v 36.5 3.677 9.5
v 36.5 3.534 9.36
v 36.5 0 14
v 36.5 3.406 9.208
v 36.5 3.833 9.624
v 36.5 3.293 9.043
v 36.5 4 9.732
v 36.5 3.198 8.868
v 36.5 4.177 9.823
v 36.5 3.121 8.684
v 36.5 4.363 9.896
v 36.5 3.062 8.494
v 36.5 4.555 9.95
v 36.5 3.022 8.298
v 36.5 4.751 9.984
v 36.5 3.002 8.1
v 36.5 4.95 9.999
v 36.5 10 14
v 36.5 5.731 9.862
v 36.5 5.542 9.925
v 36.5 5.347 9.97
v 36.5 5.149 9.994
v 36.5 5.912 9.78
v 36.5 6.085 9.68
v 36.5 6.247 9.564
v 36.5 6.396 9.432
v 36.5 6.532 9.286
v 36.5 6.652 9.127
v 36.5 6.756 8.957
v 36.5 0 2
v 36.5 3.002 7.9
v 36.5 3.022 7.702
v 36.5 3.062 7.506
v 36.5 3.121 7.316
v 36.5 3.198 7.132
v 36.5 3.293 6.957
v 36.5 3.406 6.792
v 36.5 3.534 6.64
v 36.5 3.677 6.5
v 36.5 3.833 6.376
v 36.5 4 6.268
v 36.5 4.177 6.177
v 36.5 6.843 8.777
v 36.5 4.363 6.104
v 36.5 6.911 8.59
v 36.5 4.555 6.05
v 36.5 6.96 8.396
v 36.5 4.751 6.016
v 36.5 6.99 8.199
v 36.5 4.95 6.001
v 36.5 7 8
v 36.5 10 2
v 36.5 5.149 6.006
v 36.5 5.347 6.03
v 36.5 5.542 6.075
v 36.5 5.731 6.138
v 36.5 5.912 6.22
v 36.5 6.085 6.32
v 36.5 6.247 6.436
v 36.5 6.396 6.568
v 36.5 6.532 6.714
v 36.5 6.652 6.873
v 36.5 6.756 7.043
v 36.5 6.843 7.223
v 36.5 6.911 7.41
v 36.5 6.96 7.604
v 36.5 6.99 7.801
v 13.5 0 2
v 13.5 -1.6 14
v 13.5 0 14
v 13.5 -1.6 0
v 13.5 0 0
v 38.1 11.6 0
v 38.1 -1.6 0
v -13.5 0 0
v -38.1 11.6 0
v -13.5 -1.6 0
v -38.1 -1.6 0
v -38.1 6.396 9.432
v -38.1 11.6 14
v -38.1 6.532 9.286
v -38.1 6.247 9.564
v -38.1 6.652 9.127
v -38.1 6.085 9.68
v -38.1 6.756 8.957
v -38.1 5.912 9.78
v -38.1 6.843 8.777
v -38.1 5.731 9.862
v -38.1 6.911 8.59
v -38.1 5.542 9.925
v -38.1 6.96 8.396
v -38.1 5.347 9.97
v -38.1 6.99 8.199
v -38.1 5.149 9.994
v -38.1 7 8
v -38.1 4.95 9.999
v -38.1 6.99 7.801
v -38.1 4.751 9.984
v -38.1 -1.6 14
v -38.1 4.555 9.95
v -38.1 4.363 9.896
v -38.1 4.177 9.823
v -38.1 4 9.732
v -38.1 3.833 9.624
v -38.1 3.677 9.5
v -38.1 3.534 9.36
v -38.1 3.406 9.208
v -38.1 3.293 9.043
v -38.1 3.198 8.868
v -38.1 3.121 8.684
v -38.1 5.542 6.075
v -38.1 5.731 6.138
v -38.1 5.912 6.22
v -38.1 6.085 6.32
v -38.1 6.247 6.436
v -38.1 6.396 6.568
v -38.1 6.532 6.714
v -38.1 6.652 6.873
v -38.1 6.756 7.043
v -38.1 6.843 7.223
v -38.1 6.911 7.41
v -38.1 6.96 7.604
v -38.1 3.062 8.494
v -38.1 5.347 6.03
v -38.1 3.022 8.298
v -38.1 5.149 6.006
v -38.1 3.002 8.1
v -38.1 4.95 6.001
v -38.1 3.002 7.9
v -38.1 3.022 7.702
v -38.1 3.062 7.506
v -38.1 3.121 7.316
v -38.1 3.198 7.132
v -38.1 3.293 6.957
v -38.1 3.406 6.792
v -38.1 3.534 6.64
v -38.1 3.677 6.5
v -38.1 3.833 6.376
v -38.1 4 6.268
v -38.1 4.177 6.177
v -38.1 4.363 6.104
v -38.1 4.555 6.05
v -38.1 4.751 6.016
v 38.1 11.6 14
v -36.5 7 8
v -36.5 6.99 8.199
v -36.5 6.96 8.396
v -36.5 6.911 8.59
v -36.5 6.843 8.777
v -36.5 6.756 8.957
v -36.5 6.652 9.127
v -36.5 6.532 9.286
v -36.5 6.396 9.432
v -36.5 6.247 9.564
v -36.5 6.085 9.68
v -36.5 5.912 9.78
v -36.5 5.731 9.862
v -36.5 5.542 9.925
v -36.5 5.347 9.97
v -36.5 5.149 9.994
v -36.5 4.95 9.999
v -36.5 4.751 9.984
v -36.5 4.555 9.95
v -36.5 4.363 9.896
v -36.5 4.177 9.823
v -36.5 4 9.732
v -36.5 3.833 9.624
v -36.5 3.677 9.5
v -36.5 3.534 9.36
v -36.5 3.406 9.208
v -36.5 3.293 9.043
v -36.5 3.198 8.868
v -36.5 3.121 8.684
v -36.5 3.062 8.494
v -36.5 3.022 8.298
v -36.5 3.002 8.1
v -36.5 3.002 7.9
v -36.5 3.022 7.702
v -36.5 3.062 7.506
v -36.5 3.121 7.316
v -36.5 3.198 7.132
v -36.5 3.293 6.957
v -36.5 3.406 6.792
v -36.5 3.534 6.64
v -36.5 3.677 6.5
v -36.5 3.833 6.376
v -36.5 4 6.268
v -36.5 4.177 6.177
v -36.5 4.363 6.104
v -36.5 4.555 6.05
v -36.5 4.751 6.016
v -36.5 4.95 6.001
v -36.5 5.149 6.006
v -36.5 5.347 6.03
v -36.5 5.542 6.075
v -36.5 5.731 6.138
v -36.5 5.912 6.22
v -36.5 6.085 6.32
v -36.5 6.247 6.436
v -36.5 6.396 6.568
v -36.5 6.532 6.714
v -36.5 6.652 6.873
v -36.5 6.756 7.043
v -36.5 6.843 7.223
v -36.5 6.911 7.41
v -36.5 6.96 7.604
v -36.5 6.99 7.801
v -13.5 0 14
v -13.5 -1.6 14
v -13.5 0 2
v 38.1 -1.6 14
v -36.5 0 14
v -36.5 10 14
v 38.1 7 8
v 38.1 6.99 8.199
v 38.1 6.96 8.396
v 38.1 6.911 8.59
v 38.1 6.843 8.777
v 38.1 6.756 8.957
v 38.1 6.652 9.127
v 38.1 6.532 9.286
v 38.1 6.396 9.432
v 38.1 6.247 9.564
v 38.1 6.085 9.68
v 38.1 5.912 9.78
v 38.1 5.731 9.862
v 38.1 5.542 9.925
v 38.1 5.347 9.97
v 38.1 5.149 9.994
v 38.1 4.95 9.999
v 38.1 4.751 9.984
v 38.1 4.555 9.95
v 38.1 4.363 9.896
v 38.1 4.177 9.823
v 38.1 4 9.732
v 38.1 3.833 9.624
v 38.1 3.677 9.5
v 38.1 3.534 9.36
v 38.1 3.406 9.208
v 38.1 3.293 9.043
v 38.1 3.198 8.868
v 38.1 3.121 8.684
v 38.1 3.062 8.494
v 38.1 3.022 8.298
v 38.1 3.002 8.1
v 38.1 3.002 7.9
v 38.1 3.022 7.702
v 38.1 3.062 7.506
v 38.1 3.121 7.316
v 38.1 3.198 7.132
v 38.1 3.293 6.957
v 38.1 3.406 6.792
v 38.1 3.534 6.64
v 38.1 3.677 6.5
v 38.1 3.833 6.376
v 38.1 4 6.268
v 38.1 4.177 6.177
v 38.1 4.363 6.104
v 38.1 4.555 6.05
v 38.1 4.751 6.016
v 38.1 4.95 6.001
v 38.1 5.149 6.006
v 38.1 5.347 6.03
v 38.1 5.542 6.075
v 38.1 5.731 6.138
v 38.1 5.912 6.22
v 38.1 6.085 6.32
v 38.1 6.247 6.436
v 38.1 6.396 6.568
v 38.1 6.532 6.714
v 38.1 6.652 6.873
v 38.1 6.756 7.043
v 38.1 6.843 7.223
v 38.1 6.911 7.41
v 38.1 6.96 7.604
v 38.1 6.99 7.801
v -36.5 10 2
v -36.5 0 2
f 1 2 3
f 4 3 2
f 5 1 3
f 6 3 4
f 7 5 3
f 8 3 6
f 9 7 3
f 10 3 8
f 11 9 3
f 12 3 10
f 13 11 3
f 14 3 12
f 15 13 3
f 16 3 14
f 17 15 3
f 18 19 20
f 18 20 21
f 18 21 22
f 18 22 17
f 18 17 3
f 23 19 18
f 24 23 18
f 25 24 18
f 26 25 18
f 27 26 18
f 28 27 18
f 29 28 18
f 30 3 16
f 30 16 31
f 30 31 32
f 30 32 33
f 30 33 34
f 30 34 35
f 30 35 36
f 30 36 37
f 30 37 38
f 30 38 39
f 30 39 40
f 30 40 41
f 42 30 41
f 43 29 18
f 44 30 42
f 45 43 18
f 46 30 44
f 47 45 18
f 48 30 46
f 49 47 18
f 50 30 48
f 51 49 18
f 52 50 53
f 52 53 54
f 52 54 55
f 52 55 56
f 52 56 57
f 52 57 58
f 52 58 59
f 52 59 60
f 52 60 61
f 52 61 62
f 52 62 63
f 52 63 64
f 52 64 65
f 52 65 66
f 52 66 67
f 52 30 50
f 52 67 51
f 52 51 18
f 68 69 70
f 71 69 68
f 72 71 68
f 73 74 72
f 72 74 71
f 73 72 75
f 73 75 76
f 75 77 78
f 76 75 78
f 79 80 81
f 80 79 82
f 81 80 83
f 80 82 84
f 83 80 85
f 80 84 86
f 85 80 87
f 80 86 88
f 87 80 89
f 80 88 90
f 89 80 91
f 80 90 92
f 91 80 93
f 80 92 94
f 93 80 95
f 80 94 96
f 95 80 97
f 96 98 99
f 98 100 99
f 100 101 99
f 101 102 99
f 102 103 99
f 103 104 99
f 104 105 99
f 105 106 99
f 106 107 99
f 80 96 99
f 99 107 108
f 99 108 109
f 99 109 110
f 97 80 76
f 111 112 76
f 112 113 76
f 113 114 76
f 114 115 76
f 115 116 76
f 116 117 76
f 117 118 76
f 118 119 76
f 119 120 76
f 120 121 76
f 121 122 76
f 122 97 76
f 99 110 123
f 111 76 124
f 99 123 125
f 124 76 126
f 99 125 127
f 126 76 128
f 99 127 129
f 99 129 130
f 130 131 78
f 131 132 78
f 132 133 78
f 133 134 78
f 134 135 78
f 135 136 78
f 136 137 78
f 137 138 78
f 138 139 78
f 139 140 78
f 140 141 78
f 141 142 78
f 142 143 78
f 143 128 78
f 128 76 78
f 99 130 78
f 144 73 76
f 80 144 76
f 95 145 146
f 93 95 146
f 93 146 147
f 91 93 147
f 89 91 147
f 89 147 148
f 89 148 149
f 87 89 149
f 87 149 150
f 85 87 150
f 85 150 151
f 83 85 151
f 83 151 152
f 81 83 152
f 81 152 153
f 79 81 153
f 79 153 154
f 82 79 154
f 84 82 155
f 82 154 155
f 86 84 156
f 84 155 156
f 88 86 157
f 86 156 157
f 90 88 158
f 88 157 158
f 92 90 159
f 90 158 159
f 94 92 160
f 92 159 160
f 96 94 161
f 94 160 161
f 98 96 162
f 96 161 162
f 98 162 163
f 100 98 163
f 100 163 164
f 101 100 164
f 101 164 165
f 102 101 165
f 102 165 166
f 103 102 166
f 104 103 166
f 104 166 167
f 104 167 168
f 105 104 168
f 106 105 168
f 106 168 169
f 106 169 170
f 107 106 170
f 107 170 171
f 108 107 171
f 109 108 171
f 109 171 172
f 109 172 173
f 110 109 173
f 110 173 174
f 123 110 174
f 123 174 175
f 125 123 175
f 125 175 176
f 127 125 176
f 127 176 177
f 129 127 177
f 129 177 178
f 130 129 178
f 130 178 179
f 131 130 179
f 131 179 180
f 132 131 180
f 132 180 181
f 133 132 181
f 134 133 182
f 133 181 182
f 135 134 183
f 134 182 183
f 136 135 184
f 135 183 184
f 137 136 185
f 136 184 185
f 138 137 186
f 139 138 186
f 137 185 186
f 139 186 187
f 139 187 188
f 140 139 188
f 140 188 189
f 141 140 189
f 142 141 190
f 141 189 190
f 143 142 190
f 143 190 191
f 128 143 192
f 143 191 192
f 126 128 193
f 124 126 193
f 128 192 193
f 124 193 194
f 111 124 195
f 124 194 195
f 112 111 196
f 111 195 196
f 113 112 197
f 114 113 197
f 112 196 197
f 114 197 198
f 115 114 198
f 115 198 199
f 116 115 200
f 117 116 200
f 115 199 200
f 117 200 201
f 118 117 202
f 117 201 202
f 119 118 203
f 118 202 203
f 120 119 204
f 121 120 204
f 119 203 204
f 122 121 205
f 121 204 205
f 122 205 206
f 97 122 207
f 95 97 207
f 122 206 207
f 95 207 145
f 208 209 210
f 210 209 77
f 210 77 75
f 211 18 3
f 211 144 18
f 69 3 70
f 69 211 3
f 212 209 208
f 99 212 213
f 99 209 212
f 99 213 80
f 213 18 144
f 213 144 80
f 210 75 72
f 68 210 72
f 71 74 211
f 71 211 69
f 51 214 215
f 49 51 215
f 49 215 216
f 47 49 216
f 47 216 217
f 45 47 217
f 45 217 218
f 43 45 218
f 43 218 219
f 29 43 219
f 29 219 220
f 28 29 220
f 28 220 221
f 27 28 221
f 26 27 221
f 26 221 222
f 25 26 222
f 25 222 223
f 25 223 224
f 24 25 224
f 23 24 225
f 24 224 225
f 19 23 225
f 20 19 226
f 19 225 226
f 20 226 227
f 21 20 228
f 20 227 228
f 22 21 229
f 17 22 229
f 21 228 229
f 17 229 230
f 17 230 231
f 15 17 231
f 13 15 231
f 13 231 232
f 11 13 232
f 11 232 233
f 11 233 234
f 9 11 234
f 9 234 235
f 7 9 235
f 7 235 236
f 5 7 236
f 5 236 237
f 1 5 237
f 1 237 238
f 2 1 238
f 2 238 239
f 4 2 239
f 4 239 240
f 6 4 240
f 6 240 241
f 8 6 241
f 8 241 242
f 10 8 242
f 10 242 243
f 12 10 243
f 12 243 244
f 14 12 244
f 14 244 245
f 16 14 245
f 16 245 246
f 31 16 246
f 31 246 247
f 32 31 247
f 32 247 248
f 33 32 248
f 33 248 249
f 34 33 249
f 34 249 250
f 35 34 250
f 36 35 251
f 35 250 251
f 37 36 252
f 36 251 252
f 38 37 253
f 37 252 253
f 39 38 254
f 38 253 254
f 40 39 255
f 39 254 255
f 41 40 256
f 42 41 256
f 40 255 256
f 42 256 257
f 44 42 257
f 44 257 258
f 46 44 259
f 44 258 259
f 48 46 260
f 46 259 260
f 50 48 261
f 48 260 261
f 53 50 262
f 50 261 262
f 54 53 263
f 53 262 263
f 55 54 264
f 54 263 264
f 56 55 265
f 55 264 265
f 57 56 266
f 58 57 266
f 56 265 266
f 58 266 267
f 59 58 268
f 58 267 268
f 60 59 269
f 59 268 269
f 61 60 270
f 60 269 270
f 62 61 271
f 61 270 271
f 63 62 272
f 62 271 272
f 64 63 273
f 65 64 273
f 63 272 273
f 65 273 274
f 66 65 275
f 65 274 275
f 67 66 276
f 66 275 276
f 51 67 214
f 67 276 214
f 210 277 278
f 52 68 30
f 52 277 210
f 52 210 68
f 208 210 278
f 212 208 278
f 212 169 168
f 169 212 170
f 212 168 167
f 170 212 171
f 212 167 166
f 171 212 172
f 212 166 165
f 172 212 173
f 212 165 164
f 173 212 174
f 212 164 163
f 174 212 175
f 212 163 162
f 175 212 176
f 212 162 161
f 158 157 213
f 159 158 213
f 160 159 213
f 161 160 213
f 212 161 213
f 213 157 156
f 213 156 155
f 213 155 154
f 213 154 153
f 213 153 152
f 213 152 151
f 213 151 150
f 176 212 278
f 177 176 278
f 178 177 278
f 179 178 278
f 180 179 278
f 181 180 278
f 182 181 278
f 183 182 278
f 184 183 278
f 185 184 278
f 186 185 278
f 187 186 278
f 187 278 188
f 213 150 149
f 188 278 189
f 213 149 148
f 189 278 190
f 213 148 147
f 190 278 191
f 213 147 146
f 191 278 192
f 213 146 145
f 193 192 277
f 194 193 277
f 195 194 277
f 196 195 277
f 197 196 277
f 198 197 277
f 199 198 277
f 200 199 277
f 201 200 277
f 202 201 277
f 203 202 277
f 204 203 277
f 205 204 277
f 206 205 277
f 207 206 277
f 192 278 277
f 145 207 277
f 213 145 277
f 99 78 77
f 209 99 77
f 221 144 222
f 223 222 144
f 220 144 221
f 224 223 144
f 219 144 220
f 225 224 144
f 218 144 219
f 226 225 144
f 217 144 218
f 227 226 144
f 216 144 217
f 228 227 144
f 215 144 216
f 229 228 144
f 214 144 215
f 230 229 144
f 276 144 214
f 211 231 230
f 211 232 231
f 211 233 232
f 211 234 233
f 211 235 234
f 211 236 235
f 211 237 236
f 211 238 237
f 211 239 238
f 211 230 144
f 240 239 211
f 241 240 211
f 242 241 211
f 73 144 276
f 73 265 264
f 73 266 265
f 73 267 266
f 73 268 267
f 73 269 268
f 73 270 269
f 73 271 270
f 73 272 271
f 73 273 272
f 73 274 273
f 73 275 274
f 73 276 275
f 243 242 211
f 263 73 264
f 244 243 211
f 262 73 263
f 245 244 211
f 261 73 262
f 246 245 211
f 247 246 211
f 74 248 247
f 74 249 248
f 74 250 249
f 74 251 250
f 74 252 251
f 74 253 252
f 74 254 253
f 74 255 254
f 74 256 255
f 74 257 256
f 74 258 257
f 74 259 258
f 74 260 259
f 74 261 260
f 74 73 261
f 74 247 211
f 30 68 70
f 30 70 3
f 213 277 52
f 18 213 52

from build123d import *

# Parameters (mm, degrees)
SKETCH_W     = 73
SKETCH_H     = 10
PAD_DEPTH    = 2
PAD001_DEPTH = 14
SKETCH002_R  = 2
POCKET_DEPTH = 76.201


with BuildPart() as part:
    # Sketch → Pad (new body)
    with BuildSketch(Plane.XY):
        with Locations((0, 5)):
            Rectangle(SKETCH_W, SKETCH_H)
    extrude(amount=PAD_DEPTH)

    # Sketch001 → Pad001 (new body)
    with BuildSketch(Plane(origin=(0, 0, 0), x_dir=(1, 0, 0), z_dir=(0, 0, -1))):
        Polygon((13.5, 1.6), (13.5, 0), (36.5, 0), (36.5, -10), (0, -10), (0, -11.6), (38.1, -11.6), (38.1, 1.6), align=None)
    pad001 = extrude(amount=-PAD001_DEPTH)

    # Mirrored: Pad001 across Sketch001 V_Axis
    add(pad001.mirror(Plane(origin=(0, 0, 0), x_dir=(0, 0, -1), z_dir=(1, 0, 0))))

    # Sketch002 → Pocket (cut, through all)
    with BuildSketch(Plane.YZ.offset(38.1)):
        with Locations((5, 8)):
            Circle(SKETCH002_R)
    extrude(amount=-POCKET_DEPTH, mode=Mode.SUBTRACT)


solid = part.part
